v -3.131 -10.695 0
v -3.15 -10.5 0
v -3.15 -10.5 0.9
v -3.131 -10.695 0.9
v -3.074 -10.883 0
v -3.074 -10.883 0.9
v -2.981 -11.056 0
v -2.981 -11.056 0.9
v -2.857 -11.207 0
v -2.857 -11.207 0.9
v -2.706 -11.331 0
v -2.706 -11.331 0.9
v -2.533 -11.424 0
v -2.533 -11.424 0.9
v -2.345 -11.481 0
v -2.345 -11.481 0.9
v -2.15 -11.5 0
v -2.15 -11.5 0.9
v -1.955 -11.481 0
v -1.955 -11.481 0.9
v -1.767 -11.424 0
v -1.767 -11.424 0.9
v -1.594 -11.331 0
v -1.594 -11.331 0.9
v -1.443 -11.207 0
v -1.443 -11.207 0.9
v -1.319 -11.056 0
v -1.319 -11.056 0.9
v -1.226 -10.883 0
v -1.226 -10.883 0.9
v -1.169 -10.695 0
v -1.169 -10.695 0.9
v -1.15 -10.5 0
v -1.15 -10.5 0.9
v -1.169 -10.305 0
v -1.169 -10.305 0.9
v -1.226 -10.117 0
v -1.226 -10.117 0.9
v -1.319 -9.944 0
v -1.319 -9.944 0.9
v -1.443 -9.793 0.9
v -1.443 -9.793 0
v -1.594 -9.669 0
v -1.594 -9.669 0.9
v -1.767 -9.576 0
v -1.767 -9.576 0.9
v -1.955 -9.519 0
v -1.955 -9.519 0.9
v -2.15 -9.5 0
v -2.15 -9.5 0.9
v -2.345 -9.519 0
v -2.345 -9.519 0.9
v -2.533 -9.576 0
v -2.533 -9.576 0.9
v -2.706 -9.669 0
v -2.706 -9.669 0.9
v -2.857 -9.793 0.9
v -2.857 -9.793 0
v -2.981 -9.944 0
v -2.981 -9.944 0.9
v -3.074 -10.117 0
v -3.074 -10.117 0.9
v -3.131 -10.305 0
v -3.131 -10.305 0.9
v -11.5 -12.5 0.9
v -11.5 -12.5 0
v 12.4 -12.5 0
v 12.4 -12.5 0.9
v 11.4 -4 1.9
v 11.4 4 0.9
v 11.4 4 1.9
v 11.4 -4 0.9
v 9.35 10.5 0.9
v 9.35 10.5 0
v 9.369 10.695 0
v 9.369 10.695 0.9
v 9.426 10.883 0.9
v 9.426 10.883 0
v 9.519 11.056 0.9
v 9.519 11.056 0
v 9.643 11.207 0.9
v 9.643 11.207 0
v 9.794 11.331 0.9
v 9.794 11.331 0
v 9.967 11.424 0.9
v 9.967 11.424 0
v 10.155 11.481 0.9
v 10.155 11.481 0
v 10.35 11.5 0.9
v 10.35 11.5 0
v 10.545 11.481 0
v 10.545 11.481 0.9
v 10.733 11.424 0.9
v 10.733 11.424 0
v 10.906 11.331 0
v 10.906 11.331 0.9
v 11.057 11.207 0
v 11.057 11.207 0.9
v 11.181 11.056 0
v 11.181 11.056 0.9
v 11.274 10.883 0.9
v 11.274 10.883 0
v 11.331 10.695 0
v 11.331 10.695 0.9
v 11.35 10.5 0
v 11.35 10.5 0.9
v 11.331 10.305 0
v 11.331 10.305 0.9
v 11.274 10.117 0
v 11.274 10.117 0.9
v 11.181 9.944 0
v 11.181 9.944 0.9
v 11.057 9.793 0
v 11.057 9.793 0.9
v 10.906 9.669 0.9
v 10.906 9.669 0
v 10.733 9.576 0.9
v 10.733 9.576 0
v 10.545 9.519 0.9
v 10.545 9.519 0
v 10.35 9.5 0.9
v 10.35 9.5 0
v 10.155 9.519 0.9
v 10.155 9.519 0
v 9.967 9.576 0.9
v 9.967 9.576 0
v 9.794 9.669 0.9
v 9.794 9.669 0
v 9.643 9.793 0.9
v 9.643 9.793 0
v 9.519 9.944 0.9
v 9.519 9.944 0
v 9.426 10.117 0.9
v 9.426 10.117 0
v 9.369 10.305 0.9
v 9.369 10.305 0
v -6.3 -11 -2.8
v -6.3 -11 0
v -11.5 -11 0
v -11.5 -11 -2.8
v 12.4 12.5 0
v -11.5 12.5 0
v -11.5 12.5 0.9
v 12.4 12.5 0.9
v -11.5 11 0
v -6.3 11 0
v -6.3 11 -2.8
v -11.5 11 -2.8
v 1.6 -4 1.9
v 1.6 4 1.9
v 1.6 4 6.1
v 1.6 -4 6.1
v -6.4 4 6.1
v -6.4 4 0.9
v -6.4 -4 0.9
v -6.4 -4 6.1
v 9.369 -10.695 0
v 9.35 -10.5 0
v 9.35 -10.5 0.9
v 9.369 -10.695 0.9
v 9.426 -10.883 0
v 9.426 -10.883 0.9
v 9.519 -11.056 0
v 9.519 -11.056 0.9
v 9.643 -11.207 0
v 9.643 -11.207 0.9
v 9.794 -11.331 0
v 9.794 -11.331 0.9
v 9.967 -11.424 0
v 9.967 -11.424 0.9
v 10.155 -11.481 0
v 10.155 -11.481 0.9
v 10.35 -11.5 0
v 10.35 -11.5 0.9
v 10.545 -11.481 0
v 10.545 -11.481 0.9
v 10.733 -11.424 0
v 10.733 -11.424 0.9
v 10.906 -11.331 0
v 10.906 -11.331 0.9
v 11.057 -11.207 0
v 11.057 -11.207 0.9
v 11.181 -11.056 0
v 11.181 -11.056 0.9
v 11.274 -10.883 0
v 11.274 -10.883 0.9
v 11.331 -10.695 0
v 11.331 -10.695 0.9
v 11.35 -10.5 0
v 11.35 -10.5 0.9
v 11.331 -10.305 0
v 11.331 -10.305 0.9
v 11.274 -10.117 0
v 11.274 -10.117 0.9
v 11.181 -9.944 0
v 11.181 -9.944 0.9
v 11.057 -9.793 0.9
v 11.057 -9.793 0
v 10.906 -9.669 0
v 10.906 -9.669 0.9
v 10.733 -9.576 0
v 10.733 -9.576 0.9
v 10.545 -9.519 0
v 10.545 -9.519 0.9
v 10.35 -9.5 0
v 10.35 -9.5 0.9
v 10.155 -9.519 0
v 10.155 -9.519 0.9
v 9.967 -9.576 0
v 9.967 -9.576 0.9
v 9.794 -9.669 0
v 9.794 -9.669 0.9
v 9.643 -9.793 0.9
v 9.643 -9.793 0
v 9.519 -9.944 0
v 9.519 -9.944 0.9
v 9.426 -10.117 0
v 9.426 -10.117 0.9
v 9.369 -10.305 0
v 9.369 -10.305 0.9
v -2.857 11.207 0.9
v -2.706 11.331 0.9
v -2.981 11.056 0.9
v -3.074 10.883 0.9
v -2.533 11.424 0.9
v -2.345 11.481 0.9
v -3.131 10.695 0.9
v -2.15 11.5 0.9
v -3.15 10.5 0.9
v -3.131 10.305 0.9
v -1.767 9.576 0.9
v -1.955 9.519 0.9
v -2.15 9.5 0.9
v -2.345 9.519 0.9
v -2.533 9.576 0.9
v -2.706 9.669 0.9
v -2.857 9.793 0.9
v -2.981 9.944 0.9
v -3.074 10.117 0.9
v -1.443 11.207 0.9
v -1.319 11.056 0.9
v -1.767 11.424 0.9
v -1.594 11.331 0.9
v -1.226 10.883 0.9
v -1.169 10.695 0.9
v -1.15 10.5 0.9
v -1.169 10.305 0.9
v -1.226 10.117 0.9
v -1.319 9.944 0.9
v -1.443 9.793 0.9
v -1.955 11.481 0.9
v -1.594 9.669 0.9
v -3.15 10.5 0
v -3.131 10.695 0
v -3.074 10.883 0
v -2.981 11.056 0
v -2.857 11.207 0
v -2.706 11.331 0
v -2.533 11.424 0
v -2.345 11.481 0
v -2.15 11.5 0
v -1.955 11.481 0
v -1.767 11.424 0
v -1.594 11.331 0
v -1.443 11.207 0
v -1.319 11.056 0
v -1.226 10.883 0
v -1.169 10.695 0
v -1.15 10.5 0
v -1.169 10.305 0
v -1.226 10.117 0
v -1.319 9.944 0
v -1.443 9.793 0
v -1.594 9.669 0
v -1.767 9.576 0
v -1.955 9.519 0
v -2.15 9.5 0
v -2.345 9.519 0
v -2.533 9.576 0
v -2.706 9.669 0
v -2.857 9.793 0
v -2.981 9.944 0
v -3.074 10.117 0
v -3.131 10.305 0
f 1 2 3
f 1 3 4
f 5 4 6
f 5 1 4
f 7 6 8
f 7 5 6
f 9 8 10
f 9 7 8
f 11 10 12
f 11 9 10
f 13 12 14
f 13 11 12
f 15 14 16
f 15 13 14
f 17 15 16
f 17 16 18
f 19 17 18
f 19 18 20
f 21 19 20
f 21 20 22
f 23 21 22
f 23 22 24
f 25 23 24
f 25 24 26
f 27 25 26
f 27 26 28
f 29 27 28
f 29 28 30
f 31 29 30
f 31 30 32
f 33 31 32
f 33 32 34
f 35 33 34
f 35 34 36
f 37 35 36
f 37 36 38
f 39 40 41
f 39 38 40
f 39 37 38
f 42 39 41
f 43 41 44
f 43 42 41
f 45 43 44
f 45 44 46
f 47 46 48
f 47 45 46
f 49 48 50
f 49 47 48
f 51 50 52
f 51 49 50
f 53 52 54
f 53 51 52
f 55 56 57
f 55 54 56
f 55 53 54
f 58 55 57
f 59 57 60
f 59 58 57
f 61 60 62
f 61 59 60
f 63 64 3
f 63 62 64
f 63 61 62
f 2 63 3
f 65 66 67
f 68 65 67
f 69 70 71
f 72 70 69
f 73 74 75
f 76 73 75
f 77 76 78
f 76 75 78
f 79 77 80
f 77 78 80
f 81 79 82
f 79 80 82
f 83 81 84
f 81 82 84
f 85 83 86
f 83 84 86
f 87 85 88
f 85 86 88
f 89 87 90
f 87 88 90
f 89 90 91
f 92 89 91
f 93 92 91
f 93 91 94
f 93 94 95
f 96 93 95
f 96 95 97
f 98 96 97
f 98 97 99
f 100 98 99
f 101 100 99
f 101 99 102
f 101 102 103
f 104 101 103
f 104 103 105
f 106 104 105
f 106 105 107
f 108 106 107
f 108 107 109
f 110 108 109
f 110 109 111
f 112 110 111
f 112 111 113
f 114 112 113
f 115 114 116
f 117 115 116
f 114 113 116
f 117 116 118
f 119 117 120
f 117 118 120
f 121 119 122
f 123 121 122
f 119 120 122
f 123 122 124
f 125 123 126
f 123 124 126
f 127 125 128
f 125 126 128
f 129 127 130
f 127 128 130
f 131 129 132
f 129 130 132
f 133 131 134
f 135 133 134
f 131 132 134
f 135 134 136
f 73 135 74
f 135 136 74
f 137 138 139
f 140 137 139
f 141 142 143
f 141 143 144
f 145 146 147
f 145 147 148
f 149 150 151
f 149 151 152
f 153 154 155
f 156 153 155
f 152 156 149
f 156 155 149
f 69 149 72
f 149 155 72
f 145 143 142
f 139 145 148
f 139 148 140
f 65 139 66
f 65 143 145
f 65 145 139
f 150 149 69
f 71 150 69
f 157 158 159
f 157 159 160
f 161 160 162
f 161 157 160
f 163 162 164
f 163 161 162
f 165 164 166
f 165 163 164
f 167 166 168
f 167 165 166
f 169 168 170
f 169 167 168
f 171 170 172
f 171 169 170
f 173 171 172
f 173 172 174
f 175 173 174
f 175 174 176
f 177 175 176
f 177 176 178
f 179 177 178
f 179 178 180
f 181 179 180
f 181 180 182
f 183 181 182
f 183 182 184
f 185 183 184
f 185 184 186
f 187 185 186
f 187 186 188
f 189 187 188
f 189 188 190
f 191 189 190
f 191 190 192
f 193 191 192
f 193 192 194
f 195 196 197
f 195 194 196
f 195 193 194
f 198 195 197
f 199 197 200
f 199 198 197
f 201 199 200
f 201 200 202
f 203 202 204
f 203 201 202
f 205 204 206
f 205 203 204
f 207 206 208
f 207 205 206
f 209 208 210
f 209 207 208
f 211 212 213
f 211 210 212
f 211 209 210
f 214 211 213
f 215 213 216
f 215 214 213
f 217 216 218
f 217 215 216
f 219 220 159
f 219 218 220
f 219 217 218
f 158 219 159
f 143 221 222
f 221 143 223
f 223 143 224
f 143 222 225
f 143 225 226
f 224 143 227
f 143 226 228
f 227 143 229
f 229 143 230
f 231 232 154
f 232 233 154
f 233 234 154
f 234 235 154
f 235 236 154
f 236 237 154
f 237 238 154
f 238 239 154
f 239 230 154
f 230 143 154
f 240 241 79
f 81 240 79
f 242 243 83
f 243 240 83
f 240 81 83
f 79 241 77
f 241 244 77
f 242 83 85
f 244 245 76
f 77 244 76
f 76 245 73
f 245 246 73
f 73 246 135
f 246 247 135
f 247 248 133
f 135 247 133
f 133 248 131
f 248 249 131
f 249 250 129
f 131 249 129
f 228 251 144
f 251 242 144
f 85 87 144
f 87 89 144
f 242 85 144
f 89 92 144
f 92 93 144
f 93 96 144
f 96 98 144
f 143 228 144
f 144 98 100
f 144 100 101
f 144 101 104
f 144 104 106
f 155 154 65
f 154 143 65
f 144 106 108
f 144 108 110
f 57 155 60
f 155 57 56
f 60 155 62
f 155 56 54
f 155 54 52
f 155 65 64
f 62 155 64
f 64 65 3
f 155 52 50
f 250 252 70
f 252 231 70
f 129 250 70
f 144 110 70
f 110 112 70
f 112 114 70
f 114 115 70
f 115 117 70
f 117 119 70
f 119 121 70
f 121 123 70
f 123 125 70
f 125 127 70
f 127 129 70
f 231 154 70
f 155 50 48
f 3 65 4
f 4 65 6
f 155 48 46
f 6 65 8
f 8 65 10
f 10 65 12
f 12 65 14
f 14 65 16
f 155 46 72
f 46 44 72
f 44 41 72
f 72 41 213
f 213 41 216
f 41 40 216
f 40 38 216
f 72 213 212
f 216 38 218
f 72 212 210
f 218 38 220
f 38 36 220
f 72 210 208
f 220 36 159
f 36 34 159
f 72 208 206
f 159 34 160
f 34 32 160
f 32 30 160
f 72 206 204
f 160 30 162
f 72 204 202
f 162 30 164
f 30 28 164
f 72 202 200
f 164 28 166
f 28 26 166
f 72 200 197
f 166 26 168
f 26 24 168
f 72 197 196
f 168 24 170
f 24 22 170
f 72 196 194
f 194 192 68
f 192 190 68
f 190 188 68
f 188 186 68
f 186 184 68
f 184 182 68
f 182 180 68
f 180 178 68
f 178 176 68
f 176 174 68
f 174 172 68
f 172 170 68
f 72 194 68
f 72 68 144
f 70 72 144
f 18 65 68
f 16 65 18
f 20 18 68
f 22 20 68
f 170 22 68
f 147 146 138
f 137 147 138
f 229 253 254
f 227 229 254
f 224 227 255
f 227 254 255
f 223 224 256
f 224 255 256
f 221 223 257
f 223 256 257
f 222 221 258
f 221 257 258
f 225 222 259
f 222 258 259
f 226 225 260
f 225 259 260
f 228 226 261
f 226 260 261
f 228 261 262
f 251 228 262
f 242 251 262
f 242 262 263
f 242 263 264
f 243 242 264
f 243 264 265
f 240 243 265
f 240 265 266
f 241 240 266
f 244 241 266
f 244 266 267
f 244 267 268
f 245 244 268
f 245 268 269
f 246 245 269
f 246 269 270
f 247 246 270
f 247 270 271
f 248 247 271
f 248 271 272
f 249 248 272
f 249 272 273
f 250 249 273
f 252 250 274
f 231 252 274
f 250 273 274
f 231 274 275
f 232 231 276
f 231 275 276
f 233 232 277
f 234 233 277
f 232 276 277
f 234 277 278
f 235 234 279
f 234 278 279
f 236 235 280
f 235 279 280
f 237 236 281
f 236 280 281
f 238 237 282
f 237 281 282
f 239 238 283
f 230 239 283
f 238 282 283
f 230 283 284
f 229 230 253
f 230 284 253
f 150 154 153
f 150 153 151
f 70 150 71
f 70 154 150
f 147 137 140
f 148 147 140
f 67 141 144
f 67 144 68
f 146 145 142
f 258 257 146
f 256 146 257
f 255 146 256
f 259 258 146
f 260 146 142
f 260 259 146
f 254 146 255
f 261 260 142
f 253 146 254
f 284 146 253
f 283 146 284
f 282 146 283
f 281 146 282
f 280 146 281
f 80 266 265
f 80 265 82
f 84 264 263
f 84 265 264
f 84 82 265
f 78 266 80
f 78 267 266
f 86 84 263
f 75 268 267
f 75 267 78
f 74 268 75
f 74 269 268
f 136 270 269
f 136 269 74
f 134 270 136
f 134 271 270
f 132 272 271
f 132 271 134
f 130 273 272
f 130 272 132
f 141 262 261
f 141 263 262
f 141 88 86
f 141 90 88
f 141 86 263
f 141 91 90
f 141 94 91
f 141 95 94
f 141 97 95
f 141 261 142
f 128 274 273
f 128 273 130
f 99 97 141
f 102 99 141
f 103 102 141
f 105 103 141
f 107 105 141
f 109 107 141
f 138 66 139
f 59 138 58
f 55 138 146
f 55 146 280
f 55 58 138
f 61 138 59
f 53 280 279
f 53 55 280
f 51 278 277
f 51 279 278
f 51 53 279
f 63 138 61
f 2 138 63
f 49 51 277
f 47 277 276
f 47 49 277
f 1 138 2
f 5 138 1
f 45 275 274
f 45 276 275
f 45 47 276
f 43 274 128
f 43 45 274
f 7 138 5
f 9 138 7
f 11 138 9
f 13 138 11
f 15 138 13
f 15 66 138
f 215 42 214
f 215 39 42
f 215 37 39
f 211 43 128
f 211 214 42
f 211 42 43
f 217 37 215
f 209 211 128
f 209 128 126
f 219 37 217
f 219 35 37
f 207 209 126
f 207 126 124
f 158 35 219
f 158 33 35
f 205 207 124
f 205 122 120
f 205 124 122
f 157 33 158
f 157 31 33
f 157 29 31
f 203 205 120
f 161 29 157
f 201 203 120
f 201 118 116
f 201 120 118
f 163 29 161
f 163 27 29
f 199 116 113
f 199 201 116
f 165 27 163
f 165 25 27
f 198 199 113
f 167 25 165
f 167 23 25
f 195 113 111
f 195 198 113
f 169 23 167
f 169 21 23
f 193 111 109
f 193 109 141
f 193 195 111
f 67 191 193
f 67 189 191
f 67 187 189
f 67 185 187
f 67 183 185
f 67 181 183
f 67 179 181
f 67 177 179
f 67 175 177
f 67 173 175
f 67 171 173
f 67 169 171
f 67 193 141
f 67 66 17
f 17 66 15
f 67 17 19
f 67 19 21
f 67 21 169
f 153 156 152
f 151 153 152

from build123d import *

# Parameters (mm, degrees)
CROQUIS2_W                    = 23.9
CROQUIS2_H                    = 12.5
SALIENTE_EXTRUIR1_DEPTH       = 0.9
CROQUIS4_W                    = 17.8
CROQUIS4_H                    = 4
SALIENTE_EXTRUIR2_DEPTH       = 1
CROQUIS5_W                    = 8
CROQUIS5_H                    = 4
SALIENTE_EXTRUIR3_DEPTH       = 4.2
CROQUIS6_W                    = 5.2
CROQUIS6_H                    = 11
SALIENTE_EXTRUIR4_DEPTH       = 2.8
DI_METRO_DE_TALADRO_2_0_2_1_D = 2


with BuildPart() as part:
    # Croquis2 → Saliente-Extruir1 (new body)
    with BuildSketch(Plane.XY):
        with Locations((0.45, 6.25)):
            Rectangle(CROQUIS2_W, CROQUIS2_H)
    saliente_extruir1 = extrude(amount=SALIENTE_EXTRUIR1_DEPTH)

    # Croquis4 → Saliente-Extruir2 (add)
    with BuildSketch(Plane.XY.offset(0.9)):
        with Locations((2.5, 2)):
            Rectangle(CROQUIS4_W, CROQUIS4_H)
    saliente_extruir2 = extrude(amount=SALIENTE_EXTRUIR2_DEPTH)

    # Croquis5 → Saliente-Extruir3 (add)
    with BuildSketch(Plane.XY.offset(1.9)):
        with Locations((-2.4, 2)):
            Rectangle(CROQUIS5_W, CROQUIS5_H)
    saliente_extruir3 = extrude(amount=SALIENTE_EXTRUIR3_DEPTH)

    # Croquis6 → Saliente-Extruir4 (add)
    with BuildSketch(Plane(origin=(0, 0, 0), x_dir=(-1, 0, 0), z_dir=(0, 0, -1))):
        with Locations((8.9, 5.5)):
            Rectangle(CROQUIS6_W, CROQUIS6_H)
    saliente_extruir4 = extrude(amount=SALIENTE_EXTRUIR4_DEPTH)

    # Diámetro de taladro Ø2.0 (2)1 (through all)
    with Locations(Plane(origin=(-2.15, 10.5, 0.9), x_dir=(1, 0, 0), z_dir=(0, 0, 1))):
        with Locations((0, 0), (12.5, 0)):
            di_metro_de_taladro_2_0_2_1 = Hole(DI_METRO_DE_TALADRO_2_0_2_1_D / 2)

    # Simetría1: Saliente-Extruir1, Saliente-Extruir2, Saliente-Extruir3, Saliente-Extruir4 across plane
    add(saliente_extruir1.mirror(Plane.ZX))
    add(saliente_extruir2.mirror(Plane.ZX))
    add(saliente_extruir3.mirror(Plane.ZX))
    add(saliente_extruir4.mirror(Plane.ZX))

    # Simetría2: Diámetro de taladro Ø2.0 (2)1 across plane
    add(di_metro_de_taladro_2_0_2_1.mirror(Plane.ZX), mode=Mode.SUBTRACT)


solid = part.part
